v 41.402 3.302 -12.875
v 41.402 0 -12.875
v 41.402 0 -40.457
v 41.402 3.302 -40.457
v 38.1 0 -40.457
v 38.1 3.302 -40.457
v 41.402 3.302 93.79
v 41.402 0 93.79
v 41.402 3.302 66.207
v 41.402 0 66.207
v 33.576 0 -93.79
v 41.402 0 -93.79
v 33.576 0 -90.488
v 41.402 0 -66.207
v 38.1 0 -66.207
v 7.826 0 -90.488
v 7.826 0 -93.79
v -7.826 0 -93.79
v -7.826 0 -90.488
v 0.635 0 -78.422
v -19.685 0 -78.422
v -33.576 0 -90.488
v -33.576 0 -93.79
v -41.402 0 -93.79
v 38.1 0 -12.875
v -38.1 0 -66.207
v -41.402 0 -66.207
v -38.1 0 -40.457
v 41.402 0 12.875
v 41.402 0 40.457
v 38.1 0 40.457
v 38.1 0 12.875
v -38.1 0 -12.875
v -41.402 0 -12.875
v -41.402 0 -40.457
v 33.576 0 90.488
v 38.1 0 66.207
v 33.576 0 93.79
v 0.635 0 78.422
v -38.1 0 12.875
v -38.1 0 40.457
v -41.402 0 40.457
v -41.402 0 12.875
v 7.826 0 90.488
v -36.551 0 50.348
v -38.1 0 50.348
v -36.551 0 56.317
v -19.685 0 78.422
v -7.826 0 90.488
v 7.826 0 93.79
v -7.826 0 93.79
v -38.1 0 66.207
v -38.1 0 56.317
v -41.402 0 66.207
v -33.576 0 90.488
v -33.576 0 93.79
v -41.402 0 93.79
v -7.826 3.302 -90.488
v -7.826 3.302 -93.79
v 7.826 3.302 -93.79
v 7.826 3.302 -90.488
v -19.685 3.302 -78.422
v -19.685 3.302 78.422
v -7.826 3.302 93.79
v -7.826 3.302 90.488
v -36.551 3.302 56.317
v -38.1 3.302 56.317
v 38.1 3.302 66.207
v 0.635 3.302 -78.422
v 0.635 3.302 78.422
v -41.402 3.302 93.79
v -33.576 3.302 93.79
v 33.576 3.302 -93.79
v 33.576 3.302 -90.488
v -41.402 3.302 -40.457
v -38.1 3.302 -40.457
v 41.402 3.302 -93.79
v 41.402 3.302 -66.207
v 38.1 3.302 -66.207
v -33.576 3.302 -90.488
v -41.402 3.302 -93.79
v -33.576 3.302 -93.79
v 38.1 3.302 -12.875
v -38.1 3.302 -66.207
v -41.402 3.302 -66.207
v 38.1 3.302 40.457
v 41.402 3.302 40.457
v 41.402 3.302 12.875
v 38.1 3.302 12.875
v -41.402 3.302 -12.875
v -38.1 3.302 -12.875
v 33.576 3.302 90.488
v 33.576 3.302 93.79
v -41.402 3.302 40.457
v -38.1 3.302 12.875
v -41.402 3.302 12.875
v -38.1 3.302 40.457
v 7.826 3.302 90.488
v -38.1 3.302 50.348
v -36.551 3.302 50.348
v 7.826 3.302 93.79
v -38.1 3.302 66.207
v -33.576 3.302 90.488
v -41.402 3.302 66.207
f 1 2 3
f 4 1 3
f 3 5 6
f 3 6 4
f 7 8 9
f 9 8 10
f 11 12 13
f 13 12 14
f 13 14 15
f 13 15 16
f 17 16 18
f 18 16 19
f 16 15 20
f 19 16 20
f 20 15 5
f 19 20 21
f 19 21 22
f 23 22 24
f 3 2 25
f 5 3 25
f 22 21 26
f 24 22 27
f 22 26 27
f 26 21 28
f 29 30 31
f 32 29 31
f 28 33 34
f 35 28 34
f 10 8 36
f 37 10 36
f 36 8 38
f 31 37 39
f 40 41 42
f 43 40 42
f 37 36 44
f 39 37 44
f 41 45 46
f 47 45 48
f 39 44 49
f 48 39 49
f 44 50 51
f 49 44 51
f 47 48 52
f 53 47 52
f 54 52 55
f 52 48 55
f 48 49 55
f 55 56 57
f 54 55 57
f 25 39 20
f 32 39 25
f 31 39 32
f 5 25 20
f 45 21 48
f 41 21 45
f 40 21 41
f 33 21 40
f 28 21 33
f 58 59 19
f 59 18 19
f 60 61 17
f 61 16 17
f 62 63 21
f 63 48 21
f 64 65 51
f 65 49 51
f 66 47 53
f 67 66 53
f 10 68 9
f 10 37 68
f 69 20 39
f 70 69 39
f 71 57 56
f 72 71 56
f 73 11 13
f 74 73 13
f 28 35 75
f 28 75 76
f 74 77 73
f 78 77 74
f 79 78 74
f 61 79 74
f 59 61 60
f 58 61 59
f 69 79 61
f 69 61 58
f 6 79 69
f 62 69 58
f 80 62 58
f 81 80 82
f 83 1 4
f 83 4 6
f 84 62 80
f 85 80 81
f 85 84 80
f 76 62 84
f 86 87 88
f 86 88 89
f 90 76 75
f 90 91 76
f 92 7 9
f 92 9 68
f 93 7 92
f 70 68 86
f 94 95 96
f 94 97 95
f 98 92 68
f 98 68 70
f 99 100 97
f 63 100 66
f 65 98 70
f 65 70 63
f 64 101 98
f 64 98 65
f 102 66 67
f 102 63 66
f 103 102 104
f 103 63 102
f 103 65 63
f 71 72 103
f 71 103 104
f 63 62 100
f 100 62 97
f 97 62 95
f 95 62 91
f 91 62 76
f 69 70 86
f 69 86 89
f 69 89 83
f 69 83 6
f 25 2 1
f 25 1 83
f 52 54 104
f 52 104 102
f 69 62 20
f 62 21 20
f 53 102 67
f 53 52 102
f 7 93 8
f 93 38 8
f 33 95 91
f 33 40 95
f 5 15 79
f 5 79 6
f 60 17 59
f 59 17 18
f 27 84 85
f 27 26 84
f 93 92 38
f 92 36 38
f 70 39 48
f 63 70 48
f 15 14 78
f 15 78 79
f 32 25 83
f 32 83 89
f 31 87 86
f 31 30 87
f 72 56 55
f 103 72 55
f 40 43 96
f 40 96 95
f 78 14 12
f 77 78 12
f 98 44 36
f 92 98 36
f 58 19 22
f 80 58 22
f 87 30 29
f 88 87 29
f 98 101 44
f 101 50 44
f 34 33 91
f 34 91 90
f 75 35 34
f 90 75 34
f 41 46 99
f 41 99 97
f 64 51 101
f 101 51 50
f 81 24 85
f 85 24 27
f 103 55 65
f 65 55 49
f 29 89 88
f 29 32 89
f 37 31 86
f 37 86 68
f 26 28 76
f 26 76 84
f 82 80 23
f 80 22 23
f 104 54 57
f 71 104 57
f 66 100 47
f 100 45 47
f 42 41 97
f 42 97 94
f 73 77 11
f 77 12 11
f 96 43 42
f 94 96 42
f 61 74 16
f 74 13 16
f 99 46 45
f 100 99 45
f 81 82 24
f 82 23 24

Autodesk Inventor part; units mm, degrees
ref_plane "YZ Plane" through (0, 0, 0) normal (1, 0, 0) x (0, 1, 0)
ref_plane "XZ Plane" through (0, 0, 0) normal (0, 1, 0) x (-1, 0, 0)
ref_plane "XY Plane" through (0, 0, 0) normal (0, 0, 1) x (1, 0, 0)
sketch "Sketch1" plane through (0, 0, 0) normal (0, 1, 0) x (-1, 0, 0)
  line L0 (-38.1, 90.4875) -> (38.1, 90.4875) construction
  line L1 (38.1, 90.4875) -> (38.1, -90.4875) construction
  line L2 (38.1, -90.4875) -> (-38.1, -90.4875) construction
  line L3 (-38.1, -90.4875) -> (-38.1, 90.4875) construction
  line L4 (-38.1, 90.4875) -> (38.1, -90.4875) construction
  line L5 (38.1, 90.4875) -> (-38.1, -90.4875) construction
  line L6 (19.05, 77.7875) -> (0, 77.7875) construction
  line L7 (0, 77.7875) -> (0, -77.7875) construction
  line L8 (0, -77.7875) -> (19.05, -77.7875) construction
  line L9 (19.05, -77.7875) -> (19.05, 77.7875) construction
  line L10 (41.402, 93.7895) -> (-41.402, 93.7895)
  line L11 (-41.402, 93.7895) -> (-41.402, -93.7895)
  line L12 (-41.402, -93.7895) -> (41.402, -93.7895)
  line L13 (41.402, -93.7895) -> (41.402, 93.7895)
  line L14 (41.402, 93.7895) -> (-41.402, -93.7895) construction
  line L15 (-41.402, 93.7895) -> (41.402, -93.7895) construction
  line L16 (19.685, -78.4225) -> (-0.635, -78.4225)
  line L17 (-0.635, -78.4225) -> (-0.635, 78.4225)
  line L18 (-0.635, 78.4225) -> (19.685, 78.4225)
  line L19 (19.685, 78.4225) -> (19.685, -78.4225)
  point P0 (0, 0)
  point P1 (0, 0)
  point P2 (0, 0)
  point P3 (9.525, -78.4225)
  point P4 (9.525, -77.7875)
  point P5 (19.685, 0)
  point P6 (19.05, 0)
  dimension "d0" = 19.05
  dimension "d1" = 155.575
  dimension "d2" = 3.302
  dimension "d3" = 3.302
  dimension "d4" = 12.7
  dimension "d5" = 19.05
  dimension "d6" = 38.1
  dimension "d7" = 0.635
  dimension "d8" = 0.635
extrude "Extrusion1" add sketch "Sketch1" along normal blind 3.302
sketch "Sketch2" plane through (0, 0, 0) normal (0, 1, 0) x (-1, 0, 0)
  line L0 (-41.402, 93.7895) -> (-41.402, -93.7895) projected
  line L1 (-41.402, -93.7895) -> (41.402, -93.7895) projected
  line L2 (41.402, -93.7895) -> (41.402, 93.7895) projected
  line L3 (41.402, 93.7895) -> (-41.402, 93.7895) projected
  line L4 (33.576, -93.7895) -> (7.826, -93.7895)
  line L5 (7.826, -93.7895) -> (7.826, -90.4875)
  line L6 (7.826, -90.4875) -> (33.576, -90.4875)
  line L7 (33.576, -90.4875) -> (33.576, -93.7895)
  line L8 (-7.826, -93.7895) -> (-33.576, -93.7895)
  line L9 (-33.576, -93.7895) -> (-33.576, -90.4875)
  line L10 (-33.576, -90.4875) -> (-7.826, -90.4875)
  line L11 (-7.826, -90.4875) -> (-7.826, -93.7895)
  line L12 (0, -131.3053) -> (0, 131.3053) projected
  line L13 (-66.8528, 0) -> (66.8528, 0) projected
  line L14 (-41.402, -66.2073) -> (-38.1, -66.2073)
  line L15 (-38.1, -66.2073) -> (-38.1, -40.4572)
  line L16 (-38.1, -40.4572) -> (-41.402, -40.4572)
  line L17 (-41.402, -40.4572) -> (-41.402, -66.2073)
  line L18 (-41.402, -12.875) -> (-38.1, -12.875)
  line L19 (-38.1, -12.875) -> (-38.1, 12.875)
  line L20 (-38.1, 12.875) -> (-41.402, 12.875)
  line L21 (-41.402, 12.875) -> (-41.402, -12.875)
  line L22 (-41.402, 40.4572) -> (-38.1, 40.4572)
  line L23 (-38.1, 40.4572) -> (-38.1, 66.2073)
  line L24 (-38.1, 66.2073) -> (-41.402, 66.2073)
  line L25 (-41.402, 66.2073) -> (-41.402, 40.4572)
  line L26 (38.1, 50.3478) -> (36.5506, 50.3477)
  line L27 (36.5506, 50.3477) -> (36.5506, 56.3167)
  line L28 (36.5506, 56.3167) -> (38.1, 56.3167)
  line L29 (38.1, 56.3167) -> (38.1, 50.3478)
  point P0 (0, 0)
  point P1 (20.701, -90.4875)
  point P2 (-38.1, -53.3322)
  point P3 (36.5506, 53.3322)
  point P4 (-38.1, 53.3322)
  dimension "d11" = 25.75
  dimension "d13" = 3.302
  dimension "d14" = 41.402
  dimension "d15" = 20.701
  dimension "d19" = 3.302
  dimension "d24" = 40.4573
  dimension "d25" = 80.9145
  dimension "d33" = 1.5494
  dimension "d34" = 5.969
  dimension "d35" = 3.302
  dimension "d36" = 40.4573
extrude "Extrusion2" cut sketch "Sketch2" along normal blind 3.302 contours L24 L23 L22 L0 | L20 L19 L13 L0 | L19 L18 L0 L13 | L16 L15 L14 L0
extrude "Extrusion3" cut sketch "Sketch2" along normal blind 3.302 contours L1 L9 L10 L11 | L5 L6 L7 L1
mirror "Mirror1" about plane through (0, 0, 0) normal (1, 0, 0) of "Extrusion2"
mirror "Mirror2" about plane through (0, 0, 0) normal (0, 0, 1) of "Extrusion3"
extrude "Extrusion4" cut sketch "Sketch2" along normal blind 3.302 contours L26 L27 L28 L29
equation "\"d2\" = encThick"
equation "\"d3\" = encThick"
equation "\"d9\" = encThick"
equation "\"d13\" = encThick"
equation "\"d15\" = 0.5 * d14"
equation "\"d19\" = d13"
equation "\"d24\" = 0.5 * d25"
equation "\"d35\" = encThick"
equation "\"d26\" = encThick"
equation "\"d28\" = encThick"
equation "\"d37\" = encThick"
equation "\"encThick\" = 3.302"
equation "\"encTab\" = 25.4"
equation "\"antOffset\" = d36"
properties part number "Enclosure Top" material "Glass"
